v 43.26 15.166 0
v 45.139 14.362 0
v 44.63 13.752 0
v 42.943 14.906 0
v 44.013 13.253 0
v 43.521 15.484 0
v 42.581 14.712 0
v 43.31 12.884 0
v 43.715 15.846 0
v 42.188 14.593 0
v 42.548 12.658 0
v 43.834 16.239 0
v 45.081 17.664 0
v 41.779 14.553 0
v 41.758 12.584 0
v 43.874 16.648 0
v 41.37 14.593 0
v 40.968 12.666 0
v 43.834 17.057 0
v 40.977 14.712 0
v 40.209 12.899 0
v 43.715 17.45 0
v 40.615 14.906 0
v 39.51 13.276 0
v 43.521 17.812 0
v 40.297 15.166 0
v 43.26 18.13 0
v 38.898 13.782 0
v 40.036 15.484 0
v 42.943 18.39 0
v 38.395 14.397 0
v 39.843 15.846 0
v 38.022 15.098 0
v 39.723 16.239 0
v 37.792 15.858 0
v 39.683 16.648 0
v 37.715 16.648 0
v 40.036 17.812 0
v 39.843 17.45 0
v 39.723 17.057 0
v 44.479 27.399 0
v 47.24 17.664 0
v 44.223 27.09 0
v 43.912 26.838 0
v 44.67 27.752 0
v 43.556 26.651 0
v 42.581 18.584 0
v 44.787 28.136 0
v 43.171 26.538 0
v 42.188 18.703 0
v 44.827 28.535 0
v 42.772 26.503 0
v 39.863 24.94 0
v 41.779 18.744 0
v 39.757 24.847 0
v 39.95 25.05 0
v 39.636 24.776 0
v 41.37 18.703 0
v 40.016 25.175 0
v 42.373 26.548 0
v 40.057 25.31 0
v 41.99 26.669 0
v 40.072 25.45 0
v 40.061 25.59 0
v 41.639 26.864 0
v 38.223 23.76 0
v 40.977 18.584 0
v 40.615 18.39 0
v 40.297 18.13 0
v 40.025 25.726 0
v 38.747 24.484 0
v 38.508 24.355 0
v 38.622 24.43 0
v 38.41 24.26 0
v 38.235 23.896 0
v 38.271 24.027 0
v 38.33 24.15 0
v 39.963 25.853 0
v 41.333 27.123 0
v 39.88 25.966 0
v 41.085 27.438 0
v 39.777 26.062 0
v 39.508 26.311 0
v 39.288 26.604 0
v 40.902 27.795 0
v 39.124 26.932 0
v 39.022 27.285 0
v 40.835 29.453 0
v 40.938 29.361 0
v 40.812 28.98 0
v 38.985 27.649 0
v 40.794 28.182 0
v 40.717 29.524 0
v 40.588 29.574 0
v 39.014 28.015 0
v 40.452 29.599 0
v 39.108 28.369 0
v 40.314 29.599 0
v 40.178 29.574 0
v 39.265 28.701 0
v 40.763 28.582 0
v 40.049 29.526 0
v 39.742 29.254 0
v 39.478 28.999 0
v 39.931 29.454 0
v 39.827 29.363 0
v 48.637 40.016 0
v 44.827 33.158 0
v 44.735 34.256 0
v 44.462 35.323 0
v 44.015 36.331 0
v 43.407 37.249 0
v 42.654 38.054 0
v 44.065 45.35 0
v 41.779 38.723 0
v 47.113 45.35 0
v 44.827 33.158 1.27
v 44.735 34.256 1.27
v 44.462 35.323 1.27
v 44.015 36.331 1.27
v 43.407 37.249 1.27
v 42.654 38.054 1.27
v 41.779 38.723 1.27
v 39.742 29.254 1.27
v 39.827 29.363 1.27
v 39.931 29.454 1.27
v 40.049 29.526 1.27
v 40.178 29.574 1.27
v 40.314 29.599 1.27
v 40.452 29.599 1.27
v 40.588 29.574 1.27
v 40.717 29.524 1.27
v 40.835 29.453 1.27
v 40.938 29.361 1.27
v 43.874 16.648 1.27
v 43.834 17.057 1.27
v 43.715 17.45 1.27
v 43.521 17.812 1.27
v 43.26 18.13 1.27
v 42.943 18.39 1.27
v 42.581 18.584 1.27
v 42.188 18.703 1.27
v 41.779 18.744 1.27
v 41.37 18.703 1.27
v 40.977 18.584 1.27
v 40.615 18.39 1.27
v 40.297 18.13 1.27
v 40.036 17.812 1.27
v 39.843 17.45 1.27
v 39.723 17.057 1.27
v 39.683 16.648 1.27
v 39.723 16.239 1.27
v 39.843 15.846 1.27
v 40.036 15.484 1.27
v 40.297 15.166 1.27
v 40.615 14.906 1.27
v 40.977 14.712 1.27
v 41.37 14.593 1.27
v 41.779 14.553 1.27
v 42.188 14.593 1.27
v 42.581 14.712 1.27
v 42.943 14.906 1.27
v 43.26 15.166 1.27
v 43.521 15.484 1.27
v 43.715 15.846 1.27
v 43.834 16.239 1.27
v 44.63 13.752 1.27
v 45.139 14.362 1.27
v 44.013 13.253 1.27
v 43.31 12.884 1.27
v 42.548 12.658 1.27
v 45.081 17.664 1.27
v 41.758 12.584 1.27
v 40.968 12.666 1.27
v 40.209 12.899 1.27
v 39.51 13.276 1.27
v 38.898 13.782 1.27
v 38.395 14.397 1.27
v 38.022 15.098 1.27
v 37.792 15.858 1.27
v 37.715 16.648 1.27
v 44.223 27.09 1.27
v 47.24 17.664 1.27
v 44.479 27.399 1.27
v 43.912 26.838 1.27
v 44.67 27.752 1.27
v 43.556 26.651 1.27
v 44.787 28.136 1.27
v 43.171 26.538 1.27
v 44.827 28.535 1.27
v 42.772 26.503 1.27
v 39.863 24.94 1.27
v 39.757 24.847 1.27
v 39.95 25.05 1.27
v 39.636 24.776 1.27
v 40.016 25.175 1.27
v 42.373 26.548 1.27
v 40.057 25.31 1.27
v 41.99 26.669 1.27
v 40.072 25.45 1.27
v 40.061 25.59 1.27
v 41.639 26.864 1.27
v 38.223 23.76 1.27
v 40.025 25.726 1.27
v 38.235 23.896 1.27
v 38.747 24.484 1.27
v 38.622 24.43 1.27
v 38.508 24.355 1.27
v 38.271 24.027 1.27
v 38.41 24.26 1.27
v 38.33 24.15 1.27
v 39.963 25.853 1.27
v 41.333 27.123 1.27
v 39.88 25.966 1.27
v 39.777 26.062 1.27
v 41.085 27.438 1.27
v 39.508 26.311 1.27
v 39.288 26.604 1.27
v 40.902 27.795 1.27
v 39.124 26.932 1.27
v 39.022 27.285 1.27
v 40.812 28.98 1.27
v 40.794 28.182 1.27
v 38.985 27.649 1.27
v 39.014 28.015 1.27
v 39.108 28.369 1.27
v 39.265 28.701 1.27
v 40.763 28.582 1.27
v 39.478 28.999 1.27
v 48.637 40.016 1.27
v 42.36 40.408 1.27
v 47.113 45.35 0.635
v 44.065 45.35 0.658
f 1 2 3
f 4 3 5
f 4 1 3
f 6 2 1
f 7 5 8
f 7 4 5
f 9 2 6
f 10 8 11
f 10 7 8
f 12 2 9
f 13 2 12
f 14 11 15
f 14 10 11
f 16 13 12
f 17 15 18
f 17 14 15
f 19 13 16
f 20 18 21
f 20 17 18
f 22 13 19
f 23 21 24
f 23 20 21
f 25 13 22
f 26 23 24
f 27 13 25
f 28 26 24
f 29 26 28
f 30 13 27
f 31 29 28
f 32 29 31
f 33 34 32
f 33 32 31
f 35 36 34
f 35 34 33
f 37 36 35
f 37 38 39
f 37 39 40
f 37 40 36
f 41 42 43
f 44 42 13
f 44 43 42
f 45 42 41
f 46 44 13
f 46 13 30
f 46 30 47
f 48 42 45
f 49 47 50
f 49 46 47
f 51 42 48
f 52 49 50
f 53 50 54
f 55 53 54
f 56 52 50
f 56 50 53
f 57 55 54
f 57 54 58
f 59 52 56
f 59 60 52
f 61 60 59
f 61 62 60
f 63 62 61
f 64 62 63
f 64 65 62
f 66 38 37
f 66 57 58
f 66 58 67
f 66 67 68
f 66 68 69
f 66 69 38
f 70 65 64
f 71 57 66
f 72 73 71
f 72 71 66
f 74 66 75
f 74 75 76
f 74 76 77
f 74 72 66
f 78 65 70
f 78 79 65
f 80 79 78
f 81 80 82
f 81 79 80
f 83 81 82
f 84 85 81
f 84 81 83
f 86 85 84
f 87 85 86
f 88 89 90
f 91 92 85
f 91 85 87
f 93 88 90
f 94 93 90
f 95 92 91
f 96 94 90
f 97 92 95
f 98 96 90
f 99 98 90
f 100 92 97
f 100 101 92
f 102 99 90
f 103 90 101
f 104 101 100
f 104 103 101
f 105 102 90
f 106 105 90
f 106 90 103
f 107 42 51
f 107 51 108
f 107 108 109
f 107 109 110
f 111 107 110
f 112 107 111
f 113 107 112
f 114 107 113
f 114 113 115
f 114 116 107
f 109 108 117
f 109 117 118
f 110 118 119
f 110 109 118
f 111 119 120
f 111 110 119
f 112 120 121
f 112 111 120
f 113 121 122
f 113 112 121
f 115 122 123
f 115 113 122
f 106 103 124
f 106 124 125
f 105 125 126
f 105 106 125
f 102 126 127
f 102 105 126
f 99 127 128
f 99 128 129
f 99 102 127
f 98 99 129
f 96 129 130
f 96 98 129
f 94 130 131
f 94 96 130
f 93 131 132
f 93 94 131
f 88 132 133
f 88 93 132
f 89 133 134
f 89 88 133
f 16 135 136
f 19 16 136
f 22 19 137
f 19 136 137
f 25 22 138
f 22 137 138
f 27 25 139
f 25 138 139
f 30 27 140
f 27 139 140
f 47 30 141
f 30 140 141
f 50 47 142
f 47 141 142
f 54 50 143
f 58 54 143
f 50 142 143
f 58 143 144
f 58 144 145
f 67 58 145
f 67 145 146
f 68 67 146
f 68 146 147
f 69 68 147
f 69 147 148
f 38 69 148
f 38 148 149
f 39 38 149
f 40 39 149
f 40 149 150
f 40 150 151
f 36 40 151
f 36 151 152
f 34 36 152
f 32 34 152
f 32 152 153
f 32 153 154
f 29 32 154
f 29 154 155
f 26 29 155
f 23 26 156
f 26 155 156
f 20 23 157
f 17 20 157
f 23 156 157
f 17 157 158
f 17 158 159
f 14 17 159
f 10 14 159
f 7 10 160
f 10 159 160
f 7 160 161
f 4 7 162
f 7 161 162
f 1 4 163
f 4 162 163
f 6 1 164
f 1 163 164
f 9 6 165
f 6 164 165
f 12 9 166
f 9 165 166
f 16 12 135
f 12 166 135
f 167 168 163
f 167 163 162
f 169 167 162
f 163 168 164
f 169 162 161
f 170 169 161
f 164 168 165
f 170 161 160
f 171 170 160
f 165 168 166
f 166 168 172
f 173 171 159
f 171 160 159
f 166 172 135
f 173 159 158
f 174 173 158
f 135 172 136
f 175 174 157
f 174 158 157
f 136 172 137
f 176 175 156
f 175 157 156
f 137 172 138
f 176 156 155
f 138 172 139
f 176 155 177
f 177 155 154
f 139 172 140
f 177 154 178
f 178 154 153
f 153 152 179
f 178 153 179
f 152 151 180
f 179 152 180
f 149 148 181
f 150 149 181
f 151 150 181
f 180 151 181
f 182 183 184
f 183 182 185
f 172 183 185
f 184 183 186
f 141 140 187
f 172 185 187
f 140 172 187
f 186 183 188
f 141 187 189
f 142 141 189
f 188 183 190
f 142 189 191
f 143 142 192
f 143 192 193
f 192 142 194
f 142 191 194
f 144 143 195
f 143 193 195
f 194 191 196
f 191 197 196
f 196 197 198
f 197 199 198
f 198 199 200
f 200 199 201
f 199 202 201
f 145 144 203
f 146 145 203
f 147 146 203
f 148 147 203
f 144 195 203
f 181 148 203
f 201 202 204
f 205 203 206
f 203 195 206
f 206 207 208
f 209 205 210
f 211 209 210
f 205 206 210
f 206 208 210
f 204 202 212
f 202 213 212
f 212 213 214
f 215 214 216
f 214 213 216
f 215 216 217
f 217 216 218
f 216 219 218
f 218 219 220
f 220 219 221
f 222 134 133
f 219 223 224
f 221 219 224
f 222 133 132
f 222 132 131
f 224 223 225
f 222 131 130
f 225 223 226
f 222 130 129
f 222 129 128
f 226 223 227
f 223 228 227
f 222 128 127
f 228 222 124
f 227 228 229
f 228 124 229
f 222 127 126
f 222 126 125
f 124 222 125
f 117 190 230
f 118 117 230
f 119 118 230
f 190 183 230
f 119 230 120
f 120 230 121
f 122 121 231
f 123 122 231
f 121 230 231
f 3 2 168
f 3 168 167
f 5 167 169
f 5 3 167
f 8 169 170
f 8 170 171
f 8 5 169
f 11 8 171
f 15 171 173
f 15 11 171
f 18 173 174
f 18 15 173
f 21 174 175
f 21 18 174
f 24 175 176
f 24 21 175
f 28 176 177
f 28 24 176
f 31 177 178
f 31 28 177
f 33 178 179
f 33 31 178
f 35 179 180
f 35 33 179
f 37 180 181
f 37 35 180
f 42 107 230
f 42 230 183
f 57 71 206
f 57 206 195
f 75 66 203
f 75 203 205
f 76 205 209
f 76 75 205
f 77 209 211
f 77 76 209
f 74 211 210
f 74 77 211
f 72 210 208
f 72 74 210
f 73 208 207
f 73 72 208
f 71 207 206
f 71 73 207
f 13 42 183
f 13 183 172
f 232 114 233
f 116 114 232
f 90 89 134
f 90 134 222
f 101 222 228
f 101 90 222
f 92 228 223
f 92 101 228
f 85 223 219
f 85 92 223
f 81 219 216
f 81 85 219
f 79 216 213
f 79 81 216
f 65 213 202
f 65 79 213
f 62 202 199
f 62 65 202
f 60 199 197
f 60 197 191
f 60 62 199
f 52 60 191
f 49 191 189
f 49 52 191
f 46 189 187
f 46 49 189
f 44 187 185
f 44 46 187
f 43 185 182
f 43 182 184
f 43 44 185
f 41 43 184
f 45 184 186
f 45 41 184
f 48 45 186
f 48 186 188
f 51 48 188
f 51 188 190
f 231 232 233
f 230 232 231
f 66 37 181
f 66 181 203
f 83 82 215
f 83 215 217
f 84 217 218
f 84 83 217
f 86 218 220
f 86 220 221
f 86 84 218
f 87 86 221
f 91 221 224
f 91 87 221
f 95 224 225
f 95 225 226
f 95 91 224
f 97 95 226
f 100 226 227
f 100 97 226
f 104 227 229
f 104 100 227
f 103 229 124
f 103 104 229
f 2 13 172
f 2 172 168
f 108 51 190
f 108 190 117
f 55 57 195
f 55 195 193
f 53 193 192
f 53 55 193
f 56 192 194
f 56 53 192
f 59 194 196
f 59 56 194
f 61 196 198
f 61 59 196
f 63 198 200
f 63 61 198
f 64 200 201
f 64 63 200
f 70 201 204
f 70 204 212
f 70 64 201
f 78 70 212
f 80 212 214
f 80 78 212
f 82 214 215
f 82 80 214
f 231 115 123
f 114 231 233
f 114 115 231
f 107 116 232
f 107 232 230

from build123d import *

# Parameters (mm, degrees)
BOSS_EXTRUDE1_DEPTH = 1.27
SKETCH2_R           = 2.0955
CUT_EXTRUDE1_DEPTH  = 2.27
CUT_EXTRUDE2_DEPTH  = 12.233456041


with BuildPart() as part:
    # Sketch1 → Boss-Extrude1 (new body)
    with BuildSketch(Plane.XY):
        with BuildLine():
            Line((48.63672497, 40.016070461), (47.23972497, 17.664070461))
            Line((47.23972497, 17.664070461), (45.08072497, 17.664070461))
            Line((45.08072497, 17.664070461), (45.138829135, 14.362070461))
            ThreePointArc((45.138829135, 14.362070461), (40.582766636, 12.764028795), (37.71472497, 16.648070461))
            Line((37.71472497, 16.648070461), (38.22272497, 23.760070461))
            ThreePointArc((38.22272497, 23.760070461), (38.367515348, 24.206944361), (38.746862194, 24.483994006))
            Line((38.746862194, 24.483994006), (39.635782378, 24.776070461))
            ThreePointArc((39.635782378, 24.776070461), (40.067551667, 25.379261916), (39.776898608, 26.061746677))
            ThreePointArc((39.776898608, 26.061746677), (38.984846047, 27.649488476), (39.74204727, 29.25414345))
            ThreePointArc((39.74204727, 29.25414345), (40.314007684, 29.599055552), (40.937994623, 29.360846875))
            ThreePointArc((40.937994623, 29.360846875), (42.372736858, 26.547570777), (44.82672497, 28.535270461))
            Line((44.82672497, 28.535270461), (44.82672497, 33.158070461))
            ThreePointArc((44.82672497, 33.158070461), (44.01481613, 36.330529444), (41.77872497, 38.722931645))
            Line((41.77872497, 38.722931645), (44.06472497, 45.350070461))
            Line((44.06472497, 45.350070461), (47.11272497, 45.350070461))
            Line((47.11272497, 45.350070461), (48.63672497, 40.016070461))
        make_face()
    extrude(amount=BOSS_EXTRUDE1_DEPTH)

    # Sketch2 → Cut-Extrude1 (cut, through all)
    with BuildSketch(Plane.XY.offset(1.27)):
        with Locations((41.77872497, 16.648070461)):
            Circle(SKETCH2_R)
    extrude(amount=-CUT_EXTRUDE1_DEPTH, mode=Mode.SUBTRACT)

    # Sketch3 → Cut-Extrude2 (cut, through all)
    with BuildSketch(Plane(origin=(45.956204144, -2.872262759, 0), x_dir=(0, 0, -1), z_dir=(0.998052578, -0.062378286, 0))):
        Polygon((-0.635, 48.200565798), (-1.27, 42.972017852), (-1.27, 48.200565798), align=None)
    extrude(amount=-CUT_EXTRUDE2_DEPTH, mode=Mode.SUBTRACT)


solid = part.part
